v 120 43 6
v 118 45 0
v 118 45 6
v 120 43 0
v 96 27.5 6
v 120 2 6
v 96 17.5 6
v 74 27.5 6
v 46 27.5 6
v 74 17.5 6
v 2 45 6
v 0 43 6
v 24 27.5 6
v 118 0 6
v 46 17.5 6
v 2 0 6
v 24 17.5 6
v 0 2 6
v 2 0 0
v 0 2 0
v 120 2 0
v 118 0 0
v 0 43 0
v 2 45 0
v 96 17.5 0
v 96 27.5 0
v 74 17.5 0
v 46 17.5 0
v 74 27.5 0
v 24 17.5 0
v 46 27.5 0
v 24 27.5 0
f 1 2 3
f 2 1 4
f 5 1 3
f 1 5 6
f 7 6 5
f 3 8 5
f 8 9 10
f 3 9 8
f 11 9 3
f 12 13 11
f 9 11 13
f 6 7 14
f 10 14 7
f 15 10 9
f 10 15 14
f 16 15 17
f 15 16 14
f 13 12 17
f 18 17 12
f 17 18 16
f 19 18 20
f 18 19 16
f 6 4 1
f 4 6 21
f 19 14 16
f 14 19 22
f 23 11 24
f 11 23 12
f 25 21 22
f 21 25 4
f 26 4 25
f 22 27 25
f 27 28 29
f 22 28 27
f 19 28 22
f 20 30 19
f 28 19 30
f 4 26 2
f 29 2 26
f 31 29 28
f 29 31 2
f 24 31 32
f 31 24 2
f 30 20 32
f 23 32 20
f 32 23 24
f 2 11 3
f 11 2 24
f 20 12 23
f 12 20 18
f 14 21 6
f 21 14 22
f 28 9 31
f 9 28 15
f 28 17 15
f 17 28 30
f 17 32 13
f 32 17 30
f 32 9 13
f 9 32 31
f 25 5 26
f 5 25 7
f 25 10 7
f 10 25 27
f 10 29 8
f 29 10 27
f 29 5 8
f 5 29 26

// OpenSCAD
$fn = 32;

// ----------------------------------------------------------------------
// Windowed plate: 2 voids, 120 x 45 x 6 mm
// ----------------------------------------------------------------------

// --- parameters (mm) ---
plate_l = 120;            // plate length, X
plate_w = 45;             // plate width, Y
plate_t = 6;              // plate thickness, Z
edge_margin = 10;         // wall from the plate edge to any window
windows = 2;              // number of windows in the row
win_l = 22;               // window length
win_w = 10;               // window width
win_pitch = 50;           // window pitch along X
depth_1 = 6;              // depth of void 1 (full thickness = through)
depth_2 = 6;              // depth of void 2 (full thickness = through)
corner_c = 2;             // corner chamfer of the plate
fit_tol = 0.1;            // declared fit tolerance (prompt contract)
free_tol = 0.5;           // declared free tolerance (prompt contract)

profile = [[2, 0], [118, 0], [120, 2], [120, 43], [118, 45], [2, 45], [0, 43], [0, 2]];  // primary outline, 8 points, counter clockwise
void_1 = [[24, 17.5], [46, 17.5], [46, 27.5], [24, 27.5]];  // window 1 of the row, 4 points
void_2 = [[74, 17.5], [96, 17.5], [96, 27.5], [74, 27.5]];  // window 2 of the row, 4 points

// --- the one profile operation ---
difference() {
  linear_extrude(height = plate_t) polygon(points = profile);
  translate([0, 0, -1])
    linear_extrude(height = plate_t + 2) polygon(points = void_1);
  translate([0, 0, -1])
    linear_extrude(height = plate_t + 2) polygon(points = void_2);
}
